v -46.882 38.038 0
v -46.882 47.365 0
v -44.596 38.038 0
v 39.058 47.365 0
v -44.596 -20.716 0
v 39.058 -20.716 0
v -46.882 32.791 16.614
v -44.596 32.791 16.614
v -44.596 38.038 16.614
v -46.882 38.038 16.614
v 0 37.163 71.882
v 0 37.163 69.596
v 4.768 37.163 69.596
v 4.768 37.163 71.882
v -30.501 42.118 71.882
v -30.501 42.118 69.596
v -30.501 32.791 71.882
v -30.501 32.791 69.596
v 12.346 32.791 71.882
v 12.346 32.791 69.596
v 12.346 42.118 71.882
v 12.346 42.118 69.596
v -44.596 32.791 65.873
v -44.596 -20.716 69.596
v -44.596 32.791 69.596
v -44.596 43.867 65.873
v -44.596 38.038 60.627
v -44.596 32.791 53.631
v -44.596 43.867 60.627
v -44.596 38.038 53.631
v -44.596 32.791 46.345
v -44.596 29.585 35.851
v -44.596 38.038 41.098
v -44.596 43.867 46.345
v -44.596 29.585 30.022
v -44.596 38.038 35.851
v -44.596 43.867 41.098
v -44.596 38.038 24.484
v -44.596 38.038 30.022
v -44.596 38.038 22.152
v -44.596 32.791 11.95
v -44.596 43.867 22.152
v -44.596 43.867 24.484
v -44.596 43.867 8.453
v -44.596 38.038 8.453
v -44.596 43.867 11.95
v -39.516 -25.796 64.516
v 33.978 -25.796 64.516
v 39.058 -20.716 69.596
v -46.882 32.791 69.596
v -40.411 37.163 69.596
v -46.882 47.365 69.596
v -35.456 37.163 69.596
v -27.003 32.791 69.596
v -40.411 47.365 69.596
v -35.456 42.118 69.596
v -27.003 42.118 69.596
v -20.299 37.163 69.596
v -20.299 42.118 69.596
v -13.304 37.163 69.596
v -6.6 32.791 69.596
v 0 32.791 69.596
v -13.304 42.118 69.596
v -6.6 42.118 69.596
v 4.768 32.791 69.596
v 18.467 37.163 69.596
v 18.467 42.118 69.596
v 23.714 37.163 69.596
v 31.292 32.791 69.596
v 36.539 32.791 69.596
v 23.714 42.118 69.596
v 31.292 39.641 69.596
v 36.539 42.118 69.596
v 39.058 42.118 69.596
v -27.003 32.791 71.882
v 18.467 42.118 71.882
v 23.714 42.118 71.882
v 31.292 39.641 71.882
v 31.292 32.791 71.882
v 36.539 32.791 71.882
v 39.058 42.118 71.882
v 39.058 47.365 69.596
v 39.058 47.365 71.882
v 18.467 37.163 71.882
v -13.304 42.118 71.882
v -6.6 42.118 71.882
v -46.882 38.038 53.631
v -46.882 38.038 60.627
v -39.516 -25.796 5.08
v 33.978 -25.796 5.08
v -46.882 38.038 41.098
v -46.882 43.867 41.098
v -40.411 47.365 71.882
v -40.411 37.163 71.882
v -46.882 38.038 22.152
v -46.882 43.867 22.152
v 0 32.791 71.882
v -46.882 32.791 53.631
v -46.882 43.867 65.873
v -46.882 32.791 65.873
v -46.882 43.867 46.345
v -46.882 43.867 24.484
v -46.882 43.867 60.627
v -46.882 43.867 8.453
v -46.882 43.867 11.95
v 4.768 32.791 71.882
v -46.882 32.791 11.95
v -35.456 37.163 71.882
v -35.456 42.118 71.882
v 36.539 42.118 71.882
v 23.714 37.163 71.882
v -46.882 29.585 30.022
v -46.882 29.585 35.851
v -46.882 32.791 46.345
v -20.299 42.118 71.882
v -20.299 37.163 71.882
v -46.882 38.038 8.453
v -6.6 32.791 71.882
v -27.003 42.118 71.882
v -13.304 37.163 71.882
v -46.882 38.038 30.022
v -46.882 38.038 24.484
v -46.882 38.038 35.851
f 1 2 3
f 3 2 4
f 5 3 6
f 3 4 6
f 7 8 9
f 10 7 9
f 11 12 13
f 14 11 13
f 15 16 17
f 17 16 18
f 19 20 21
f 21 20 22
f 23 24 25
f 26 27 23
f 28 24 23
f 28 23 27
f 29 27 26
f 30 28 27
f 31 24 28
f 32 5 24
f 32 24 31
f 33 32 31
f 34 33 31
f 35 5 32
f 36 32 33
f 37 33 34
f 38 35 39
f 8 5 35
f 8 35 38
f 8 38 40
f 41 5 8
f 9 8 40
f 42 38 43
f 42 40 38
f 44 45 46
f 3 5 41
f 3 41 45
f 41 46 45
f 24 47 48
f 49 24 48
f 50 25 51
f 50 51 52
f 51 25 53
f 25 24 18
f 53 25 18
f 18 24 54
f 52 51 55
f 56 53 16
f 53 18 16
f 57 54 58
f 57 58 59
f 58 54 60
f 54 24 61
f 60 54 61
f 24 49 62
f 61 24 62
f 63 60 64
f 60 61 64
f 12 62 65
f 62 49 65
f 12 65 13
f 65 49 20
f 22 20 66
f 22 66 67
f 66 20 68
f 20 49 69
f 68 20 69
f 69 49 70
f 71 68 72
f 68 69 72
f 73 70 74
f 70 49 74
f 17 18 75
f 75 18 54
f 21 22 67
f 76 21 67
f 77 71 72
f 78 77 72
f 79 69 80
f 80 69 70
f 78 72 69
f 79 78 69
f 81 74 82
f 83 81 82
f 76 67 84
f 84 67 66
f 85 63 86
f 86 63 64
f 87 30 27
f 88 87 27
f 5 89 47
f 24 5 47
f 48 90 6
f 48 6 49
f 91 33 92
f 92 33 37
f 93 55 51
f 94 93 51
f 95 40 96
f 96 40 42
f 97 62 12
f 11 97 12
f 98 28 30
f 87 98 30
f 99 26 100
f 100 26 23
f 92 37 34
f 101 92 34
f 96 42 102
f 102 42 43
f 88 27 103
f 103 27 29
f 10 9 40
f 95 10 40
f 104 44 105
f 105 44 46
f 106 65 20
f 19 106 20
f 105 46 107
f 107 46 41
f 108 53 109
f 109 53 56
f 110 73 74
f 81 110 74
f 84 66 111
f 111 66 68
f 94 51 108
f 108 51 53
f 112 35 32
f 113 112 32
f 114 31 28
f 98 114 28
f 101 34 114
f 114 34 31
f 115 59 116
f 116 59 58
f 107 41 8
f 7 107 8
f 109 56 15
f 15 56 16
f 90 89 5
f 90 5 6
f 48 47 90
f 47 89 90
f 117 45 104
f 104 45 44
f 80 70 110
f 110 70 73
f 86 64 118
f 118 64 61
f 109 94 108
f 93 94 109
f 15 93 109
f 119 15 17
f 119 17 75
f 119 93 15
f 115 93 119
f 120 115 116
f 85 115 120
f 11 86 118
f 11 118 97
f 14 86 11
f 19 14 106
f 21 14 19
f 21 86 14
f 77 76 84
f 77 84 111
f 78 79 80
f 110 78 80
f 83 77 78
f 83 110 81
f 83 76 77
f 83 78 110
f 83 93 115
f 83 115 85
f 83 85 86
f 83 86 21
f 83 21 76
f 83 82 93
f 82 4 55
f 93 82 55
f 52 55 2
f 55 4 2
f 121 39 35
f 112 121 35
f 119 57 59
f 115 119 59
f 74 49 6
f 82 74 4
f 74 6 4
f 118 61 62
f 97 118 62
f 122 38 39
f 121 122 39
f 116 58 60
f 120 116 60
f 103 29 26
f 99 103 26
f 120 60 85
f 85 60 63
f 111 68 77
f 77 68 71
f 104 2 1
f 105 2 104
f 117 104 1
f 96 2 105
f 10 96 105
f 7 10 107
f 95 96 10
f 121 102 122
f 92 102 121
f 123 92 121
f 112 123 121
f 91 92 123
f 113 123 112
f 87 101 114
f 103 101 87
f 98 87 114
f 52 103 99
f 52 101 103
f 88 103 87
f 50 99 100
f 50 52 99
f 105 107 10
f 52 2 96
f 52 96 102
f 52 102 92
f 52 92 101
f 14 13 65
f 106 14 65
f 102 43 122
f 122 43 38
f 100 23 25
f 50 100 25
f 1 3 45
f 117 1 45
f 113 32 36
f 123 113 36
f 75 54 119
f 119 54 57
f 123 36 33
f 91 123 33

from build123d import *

# Parameters (mm, degrees)
F0_W     = 83.653443
F0_H     = 73.160328
F1_DEPTH = 69.596
F3_DEPTH = 2.286
F5_DEPTH = 2.286
F6_SIZE  = 5.08


with BuildPart() as f1:
    # F0 (on Top) → F1 (new body)
    with BuildSketch(Plane.XY):
        with Locations((-2.769016, 10.784589)):
            Rectangle(F0_W, F0_H)
    extrude(amount=F1_DEPTH)

    # F2 (on face) → F3 (join)
    with BuildSketch(Plane(origin=(-44.595737, 0, 0), x_dir=(0, -1, 0), z_dir=(-1, 0, 0))):
        Polygon((-47.364753, 0), (-38.037542, 0), (-38.037542, 8.452787), (-43.867048, 8.452787), (-43.867048, 11.950491), (-32.790981, 11.950491), (-32.790981, 16.6141), (-38.037542, 16.6141), (-38.037542, 22.152131), (-43.867048, 22.152131), (-43.867048, 24.483934), (-38.037542, 24.483934), (-38.037542, 30.021966), (-29.584754, 30.021966), (-29.584754, 35.851479), (-38.037542, 35.851479), (-38.037542, 41.098036), (-43.867048, 41.098036), (-43.867048, 46.344589), (-32.790981, 46.344589), (-32.790981, 53.631473), (-38.037542, 53.631473), (-38.037542, 60.626887), (-43.867048, 60.626887), (-43.867048, 65.873444), (-32.790981, 65.873444), (-32.790981, 69.596), (-47.364753, 69.596), align=None)
    extrude(amount=F3_DEPTH)

    # F4 (on face) → F5 (join)
    with BuildSketch(Plane.XY.offset(69.596)):
        Polygon((39.057706, 47.364753), (-40.410984, 47.364753), (-40.410984, 37.163116), (-35.455901, 37.163116), (-35.455901, 42.118195), (-30.50082, 42.118195), (-30.50082, 32.790981), (-27.003115, 32.790981), (-27.003115, 42.118195), (-20.299181, 42.118195), (-20.299181, 37.163116), (-13.303772, 37.163116), (-13.303772, 42.118195), (-6.599837, 42.118195), (-6.599837, 32.790981), (0, 32.790981), (0, 37.163116), (4.767703, 37.163116), (4.767703, 32.790981), (12.346066, 32.790981), (12.346066, 42.118195), (18.467048, 42.118195), (18.467048, 37.163116), (23.713607, 37.163116), (23.713607, 42.118195), (31.291965, 39.640656), (31.291965, 32.790981), (36.538523, 32.790981), (36.538523, 42.118195), (39.057706, 42.118195), align=None)
    extrude(amount=F5_DEPTH)

    # F6
    f6_edges = [f1.edges().sort_by_distance(p)[0] for p in [
        (-2.769016, -25.795575, 69.596),
        (-44.595737, -25.795575, 34.798),
        (-2.769016, -25.795575, 0),
        (39.057706, -25.795575, 34.798),
    ]]
    chamfer(f6_edges, length=F6_SIZE)


solid = f1.part
